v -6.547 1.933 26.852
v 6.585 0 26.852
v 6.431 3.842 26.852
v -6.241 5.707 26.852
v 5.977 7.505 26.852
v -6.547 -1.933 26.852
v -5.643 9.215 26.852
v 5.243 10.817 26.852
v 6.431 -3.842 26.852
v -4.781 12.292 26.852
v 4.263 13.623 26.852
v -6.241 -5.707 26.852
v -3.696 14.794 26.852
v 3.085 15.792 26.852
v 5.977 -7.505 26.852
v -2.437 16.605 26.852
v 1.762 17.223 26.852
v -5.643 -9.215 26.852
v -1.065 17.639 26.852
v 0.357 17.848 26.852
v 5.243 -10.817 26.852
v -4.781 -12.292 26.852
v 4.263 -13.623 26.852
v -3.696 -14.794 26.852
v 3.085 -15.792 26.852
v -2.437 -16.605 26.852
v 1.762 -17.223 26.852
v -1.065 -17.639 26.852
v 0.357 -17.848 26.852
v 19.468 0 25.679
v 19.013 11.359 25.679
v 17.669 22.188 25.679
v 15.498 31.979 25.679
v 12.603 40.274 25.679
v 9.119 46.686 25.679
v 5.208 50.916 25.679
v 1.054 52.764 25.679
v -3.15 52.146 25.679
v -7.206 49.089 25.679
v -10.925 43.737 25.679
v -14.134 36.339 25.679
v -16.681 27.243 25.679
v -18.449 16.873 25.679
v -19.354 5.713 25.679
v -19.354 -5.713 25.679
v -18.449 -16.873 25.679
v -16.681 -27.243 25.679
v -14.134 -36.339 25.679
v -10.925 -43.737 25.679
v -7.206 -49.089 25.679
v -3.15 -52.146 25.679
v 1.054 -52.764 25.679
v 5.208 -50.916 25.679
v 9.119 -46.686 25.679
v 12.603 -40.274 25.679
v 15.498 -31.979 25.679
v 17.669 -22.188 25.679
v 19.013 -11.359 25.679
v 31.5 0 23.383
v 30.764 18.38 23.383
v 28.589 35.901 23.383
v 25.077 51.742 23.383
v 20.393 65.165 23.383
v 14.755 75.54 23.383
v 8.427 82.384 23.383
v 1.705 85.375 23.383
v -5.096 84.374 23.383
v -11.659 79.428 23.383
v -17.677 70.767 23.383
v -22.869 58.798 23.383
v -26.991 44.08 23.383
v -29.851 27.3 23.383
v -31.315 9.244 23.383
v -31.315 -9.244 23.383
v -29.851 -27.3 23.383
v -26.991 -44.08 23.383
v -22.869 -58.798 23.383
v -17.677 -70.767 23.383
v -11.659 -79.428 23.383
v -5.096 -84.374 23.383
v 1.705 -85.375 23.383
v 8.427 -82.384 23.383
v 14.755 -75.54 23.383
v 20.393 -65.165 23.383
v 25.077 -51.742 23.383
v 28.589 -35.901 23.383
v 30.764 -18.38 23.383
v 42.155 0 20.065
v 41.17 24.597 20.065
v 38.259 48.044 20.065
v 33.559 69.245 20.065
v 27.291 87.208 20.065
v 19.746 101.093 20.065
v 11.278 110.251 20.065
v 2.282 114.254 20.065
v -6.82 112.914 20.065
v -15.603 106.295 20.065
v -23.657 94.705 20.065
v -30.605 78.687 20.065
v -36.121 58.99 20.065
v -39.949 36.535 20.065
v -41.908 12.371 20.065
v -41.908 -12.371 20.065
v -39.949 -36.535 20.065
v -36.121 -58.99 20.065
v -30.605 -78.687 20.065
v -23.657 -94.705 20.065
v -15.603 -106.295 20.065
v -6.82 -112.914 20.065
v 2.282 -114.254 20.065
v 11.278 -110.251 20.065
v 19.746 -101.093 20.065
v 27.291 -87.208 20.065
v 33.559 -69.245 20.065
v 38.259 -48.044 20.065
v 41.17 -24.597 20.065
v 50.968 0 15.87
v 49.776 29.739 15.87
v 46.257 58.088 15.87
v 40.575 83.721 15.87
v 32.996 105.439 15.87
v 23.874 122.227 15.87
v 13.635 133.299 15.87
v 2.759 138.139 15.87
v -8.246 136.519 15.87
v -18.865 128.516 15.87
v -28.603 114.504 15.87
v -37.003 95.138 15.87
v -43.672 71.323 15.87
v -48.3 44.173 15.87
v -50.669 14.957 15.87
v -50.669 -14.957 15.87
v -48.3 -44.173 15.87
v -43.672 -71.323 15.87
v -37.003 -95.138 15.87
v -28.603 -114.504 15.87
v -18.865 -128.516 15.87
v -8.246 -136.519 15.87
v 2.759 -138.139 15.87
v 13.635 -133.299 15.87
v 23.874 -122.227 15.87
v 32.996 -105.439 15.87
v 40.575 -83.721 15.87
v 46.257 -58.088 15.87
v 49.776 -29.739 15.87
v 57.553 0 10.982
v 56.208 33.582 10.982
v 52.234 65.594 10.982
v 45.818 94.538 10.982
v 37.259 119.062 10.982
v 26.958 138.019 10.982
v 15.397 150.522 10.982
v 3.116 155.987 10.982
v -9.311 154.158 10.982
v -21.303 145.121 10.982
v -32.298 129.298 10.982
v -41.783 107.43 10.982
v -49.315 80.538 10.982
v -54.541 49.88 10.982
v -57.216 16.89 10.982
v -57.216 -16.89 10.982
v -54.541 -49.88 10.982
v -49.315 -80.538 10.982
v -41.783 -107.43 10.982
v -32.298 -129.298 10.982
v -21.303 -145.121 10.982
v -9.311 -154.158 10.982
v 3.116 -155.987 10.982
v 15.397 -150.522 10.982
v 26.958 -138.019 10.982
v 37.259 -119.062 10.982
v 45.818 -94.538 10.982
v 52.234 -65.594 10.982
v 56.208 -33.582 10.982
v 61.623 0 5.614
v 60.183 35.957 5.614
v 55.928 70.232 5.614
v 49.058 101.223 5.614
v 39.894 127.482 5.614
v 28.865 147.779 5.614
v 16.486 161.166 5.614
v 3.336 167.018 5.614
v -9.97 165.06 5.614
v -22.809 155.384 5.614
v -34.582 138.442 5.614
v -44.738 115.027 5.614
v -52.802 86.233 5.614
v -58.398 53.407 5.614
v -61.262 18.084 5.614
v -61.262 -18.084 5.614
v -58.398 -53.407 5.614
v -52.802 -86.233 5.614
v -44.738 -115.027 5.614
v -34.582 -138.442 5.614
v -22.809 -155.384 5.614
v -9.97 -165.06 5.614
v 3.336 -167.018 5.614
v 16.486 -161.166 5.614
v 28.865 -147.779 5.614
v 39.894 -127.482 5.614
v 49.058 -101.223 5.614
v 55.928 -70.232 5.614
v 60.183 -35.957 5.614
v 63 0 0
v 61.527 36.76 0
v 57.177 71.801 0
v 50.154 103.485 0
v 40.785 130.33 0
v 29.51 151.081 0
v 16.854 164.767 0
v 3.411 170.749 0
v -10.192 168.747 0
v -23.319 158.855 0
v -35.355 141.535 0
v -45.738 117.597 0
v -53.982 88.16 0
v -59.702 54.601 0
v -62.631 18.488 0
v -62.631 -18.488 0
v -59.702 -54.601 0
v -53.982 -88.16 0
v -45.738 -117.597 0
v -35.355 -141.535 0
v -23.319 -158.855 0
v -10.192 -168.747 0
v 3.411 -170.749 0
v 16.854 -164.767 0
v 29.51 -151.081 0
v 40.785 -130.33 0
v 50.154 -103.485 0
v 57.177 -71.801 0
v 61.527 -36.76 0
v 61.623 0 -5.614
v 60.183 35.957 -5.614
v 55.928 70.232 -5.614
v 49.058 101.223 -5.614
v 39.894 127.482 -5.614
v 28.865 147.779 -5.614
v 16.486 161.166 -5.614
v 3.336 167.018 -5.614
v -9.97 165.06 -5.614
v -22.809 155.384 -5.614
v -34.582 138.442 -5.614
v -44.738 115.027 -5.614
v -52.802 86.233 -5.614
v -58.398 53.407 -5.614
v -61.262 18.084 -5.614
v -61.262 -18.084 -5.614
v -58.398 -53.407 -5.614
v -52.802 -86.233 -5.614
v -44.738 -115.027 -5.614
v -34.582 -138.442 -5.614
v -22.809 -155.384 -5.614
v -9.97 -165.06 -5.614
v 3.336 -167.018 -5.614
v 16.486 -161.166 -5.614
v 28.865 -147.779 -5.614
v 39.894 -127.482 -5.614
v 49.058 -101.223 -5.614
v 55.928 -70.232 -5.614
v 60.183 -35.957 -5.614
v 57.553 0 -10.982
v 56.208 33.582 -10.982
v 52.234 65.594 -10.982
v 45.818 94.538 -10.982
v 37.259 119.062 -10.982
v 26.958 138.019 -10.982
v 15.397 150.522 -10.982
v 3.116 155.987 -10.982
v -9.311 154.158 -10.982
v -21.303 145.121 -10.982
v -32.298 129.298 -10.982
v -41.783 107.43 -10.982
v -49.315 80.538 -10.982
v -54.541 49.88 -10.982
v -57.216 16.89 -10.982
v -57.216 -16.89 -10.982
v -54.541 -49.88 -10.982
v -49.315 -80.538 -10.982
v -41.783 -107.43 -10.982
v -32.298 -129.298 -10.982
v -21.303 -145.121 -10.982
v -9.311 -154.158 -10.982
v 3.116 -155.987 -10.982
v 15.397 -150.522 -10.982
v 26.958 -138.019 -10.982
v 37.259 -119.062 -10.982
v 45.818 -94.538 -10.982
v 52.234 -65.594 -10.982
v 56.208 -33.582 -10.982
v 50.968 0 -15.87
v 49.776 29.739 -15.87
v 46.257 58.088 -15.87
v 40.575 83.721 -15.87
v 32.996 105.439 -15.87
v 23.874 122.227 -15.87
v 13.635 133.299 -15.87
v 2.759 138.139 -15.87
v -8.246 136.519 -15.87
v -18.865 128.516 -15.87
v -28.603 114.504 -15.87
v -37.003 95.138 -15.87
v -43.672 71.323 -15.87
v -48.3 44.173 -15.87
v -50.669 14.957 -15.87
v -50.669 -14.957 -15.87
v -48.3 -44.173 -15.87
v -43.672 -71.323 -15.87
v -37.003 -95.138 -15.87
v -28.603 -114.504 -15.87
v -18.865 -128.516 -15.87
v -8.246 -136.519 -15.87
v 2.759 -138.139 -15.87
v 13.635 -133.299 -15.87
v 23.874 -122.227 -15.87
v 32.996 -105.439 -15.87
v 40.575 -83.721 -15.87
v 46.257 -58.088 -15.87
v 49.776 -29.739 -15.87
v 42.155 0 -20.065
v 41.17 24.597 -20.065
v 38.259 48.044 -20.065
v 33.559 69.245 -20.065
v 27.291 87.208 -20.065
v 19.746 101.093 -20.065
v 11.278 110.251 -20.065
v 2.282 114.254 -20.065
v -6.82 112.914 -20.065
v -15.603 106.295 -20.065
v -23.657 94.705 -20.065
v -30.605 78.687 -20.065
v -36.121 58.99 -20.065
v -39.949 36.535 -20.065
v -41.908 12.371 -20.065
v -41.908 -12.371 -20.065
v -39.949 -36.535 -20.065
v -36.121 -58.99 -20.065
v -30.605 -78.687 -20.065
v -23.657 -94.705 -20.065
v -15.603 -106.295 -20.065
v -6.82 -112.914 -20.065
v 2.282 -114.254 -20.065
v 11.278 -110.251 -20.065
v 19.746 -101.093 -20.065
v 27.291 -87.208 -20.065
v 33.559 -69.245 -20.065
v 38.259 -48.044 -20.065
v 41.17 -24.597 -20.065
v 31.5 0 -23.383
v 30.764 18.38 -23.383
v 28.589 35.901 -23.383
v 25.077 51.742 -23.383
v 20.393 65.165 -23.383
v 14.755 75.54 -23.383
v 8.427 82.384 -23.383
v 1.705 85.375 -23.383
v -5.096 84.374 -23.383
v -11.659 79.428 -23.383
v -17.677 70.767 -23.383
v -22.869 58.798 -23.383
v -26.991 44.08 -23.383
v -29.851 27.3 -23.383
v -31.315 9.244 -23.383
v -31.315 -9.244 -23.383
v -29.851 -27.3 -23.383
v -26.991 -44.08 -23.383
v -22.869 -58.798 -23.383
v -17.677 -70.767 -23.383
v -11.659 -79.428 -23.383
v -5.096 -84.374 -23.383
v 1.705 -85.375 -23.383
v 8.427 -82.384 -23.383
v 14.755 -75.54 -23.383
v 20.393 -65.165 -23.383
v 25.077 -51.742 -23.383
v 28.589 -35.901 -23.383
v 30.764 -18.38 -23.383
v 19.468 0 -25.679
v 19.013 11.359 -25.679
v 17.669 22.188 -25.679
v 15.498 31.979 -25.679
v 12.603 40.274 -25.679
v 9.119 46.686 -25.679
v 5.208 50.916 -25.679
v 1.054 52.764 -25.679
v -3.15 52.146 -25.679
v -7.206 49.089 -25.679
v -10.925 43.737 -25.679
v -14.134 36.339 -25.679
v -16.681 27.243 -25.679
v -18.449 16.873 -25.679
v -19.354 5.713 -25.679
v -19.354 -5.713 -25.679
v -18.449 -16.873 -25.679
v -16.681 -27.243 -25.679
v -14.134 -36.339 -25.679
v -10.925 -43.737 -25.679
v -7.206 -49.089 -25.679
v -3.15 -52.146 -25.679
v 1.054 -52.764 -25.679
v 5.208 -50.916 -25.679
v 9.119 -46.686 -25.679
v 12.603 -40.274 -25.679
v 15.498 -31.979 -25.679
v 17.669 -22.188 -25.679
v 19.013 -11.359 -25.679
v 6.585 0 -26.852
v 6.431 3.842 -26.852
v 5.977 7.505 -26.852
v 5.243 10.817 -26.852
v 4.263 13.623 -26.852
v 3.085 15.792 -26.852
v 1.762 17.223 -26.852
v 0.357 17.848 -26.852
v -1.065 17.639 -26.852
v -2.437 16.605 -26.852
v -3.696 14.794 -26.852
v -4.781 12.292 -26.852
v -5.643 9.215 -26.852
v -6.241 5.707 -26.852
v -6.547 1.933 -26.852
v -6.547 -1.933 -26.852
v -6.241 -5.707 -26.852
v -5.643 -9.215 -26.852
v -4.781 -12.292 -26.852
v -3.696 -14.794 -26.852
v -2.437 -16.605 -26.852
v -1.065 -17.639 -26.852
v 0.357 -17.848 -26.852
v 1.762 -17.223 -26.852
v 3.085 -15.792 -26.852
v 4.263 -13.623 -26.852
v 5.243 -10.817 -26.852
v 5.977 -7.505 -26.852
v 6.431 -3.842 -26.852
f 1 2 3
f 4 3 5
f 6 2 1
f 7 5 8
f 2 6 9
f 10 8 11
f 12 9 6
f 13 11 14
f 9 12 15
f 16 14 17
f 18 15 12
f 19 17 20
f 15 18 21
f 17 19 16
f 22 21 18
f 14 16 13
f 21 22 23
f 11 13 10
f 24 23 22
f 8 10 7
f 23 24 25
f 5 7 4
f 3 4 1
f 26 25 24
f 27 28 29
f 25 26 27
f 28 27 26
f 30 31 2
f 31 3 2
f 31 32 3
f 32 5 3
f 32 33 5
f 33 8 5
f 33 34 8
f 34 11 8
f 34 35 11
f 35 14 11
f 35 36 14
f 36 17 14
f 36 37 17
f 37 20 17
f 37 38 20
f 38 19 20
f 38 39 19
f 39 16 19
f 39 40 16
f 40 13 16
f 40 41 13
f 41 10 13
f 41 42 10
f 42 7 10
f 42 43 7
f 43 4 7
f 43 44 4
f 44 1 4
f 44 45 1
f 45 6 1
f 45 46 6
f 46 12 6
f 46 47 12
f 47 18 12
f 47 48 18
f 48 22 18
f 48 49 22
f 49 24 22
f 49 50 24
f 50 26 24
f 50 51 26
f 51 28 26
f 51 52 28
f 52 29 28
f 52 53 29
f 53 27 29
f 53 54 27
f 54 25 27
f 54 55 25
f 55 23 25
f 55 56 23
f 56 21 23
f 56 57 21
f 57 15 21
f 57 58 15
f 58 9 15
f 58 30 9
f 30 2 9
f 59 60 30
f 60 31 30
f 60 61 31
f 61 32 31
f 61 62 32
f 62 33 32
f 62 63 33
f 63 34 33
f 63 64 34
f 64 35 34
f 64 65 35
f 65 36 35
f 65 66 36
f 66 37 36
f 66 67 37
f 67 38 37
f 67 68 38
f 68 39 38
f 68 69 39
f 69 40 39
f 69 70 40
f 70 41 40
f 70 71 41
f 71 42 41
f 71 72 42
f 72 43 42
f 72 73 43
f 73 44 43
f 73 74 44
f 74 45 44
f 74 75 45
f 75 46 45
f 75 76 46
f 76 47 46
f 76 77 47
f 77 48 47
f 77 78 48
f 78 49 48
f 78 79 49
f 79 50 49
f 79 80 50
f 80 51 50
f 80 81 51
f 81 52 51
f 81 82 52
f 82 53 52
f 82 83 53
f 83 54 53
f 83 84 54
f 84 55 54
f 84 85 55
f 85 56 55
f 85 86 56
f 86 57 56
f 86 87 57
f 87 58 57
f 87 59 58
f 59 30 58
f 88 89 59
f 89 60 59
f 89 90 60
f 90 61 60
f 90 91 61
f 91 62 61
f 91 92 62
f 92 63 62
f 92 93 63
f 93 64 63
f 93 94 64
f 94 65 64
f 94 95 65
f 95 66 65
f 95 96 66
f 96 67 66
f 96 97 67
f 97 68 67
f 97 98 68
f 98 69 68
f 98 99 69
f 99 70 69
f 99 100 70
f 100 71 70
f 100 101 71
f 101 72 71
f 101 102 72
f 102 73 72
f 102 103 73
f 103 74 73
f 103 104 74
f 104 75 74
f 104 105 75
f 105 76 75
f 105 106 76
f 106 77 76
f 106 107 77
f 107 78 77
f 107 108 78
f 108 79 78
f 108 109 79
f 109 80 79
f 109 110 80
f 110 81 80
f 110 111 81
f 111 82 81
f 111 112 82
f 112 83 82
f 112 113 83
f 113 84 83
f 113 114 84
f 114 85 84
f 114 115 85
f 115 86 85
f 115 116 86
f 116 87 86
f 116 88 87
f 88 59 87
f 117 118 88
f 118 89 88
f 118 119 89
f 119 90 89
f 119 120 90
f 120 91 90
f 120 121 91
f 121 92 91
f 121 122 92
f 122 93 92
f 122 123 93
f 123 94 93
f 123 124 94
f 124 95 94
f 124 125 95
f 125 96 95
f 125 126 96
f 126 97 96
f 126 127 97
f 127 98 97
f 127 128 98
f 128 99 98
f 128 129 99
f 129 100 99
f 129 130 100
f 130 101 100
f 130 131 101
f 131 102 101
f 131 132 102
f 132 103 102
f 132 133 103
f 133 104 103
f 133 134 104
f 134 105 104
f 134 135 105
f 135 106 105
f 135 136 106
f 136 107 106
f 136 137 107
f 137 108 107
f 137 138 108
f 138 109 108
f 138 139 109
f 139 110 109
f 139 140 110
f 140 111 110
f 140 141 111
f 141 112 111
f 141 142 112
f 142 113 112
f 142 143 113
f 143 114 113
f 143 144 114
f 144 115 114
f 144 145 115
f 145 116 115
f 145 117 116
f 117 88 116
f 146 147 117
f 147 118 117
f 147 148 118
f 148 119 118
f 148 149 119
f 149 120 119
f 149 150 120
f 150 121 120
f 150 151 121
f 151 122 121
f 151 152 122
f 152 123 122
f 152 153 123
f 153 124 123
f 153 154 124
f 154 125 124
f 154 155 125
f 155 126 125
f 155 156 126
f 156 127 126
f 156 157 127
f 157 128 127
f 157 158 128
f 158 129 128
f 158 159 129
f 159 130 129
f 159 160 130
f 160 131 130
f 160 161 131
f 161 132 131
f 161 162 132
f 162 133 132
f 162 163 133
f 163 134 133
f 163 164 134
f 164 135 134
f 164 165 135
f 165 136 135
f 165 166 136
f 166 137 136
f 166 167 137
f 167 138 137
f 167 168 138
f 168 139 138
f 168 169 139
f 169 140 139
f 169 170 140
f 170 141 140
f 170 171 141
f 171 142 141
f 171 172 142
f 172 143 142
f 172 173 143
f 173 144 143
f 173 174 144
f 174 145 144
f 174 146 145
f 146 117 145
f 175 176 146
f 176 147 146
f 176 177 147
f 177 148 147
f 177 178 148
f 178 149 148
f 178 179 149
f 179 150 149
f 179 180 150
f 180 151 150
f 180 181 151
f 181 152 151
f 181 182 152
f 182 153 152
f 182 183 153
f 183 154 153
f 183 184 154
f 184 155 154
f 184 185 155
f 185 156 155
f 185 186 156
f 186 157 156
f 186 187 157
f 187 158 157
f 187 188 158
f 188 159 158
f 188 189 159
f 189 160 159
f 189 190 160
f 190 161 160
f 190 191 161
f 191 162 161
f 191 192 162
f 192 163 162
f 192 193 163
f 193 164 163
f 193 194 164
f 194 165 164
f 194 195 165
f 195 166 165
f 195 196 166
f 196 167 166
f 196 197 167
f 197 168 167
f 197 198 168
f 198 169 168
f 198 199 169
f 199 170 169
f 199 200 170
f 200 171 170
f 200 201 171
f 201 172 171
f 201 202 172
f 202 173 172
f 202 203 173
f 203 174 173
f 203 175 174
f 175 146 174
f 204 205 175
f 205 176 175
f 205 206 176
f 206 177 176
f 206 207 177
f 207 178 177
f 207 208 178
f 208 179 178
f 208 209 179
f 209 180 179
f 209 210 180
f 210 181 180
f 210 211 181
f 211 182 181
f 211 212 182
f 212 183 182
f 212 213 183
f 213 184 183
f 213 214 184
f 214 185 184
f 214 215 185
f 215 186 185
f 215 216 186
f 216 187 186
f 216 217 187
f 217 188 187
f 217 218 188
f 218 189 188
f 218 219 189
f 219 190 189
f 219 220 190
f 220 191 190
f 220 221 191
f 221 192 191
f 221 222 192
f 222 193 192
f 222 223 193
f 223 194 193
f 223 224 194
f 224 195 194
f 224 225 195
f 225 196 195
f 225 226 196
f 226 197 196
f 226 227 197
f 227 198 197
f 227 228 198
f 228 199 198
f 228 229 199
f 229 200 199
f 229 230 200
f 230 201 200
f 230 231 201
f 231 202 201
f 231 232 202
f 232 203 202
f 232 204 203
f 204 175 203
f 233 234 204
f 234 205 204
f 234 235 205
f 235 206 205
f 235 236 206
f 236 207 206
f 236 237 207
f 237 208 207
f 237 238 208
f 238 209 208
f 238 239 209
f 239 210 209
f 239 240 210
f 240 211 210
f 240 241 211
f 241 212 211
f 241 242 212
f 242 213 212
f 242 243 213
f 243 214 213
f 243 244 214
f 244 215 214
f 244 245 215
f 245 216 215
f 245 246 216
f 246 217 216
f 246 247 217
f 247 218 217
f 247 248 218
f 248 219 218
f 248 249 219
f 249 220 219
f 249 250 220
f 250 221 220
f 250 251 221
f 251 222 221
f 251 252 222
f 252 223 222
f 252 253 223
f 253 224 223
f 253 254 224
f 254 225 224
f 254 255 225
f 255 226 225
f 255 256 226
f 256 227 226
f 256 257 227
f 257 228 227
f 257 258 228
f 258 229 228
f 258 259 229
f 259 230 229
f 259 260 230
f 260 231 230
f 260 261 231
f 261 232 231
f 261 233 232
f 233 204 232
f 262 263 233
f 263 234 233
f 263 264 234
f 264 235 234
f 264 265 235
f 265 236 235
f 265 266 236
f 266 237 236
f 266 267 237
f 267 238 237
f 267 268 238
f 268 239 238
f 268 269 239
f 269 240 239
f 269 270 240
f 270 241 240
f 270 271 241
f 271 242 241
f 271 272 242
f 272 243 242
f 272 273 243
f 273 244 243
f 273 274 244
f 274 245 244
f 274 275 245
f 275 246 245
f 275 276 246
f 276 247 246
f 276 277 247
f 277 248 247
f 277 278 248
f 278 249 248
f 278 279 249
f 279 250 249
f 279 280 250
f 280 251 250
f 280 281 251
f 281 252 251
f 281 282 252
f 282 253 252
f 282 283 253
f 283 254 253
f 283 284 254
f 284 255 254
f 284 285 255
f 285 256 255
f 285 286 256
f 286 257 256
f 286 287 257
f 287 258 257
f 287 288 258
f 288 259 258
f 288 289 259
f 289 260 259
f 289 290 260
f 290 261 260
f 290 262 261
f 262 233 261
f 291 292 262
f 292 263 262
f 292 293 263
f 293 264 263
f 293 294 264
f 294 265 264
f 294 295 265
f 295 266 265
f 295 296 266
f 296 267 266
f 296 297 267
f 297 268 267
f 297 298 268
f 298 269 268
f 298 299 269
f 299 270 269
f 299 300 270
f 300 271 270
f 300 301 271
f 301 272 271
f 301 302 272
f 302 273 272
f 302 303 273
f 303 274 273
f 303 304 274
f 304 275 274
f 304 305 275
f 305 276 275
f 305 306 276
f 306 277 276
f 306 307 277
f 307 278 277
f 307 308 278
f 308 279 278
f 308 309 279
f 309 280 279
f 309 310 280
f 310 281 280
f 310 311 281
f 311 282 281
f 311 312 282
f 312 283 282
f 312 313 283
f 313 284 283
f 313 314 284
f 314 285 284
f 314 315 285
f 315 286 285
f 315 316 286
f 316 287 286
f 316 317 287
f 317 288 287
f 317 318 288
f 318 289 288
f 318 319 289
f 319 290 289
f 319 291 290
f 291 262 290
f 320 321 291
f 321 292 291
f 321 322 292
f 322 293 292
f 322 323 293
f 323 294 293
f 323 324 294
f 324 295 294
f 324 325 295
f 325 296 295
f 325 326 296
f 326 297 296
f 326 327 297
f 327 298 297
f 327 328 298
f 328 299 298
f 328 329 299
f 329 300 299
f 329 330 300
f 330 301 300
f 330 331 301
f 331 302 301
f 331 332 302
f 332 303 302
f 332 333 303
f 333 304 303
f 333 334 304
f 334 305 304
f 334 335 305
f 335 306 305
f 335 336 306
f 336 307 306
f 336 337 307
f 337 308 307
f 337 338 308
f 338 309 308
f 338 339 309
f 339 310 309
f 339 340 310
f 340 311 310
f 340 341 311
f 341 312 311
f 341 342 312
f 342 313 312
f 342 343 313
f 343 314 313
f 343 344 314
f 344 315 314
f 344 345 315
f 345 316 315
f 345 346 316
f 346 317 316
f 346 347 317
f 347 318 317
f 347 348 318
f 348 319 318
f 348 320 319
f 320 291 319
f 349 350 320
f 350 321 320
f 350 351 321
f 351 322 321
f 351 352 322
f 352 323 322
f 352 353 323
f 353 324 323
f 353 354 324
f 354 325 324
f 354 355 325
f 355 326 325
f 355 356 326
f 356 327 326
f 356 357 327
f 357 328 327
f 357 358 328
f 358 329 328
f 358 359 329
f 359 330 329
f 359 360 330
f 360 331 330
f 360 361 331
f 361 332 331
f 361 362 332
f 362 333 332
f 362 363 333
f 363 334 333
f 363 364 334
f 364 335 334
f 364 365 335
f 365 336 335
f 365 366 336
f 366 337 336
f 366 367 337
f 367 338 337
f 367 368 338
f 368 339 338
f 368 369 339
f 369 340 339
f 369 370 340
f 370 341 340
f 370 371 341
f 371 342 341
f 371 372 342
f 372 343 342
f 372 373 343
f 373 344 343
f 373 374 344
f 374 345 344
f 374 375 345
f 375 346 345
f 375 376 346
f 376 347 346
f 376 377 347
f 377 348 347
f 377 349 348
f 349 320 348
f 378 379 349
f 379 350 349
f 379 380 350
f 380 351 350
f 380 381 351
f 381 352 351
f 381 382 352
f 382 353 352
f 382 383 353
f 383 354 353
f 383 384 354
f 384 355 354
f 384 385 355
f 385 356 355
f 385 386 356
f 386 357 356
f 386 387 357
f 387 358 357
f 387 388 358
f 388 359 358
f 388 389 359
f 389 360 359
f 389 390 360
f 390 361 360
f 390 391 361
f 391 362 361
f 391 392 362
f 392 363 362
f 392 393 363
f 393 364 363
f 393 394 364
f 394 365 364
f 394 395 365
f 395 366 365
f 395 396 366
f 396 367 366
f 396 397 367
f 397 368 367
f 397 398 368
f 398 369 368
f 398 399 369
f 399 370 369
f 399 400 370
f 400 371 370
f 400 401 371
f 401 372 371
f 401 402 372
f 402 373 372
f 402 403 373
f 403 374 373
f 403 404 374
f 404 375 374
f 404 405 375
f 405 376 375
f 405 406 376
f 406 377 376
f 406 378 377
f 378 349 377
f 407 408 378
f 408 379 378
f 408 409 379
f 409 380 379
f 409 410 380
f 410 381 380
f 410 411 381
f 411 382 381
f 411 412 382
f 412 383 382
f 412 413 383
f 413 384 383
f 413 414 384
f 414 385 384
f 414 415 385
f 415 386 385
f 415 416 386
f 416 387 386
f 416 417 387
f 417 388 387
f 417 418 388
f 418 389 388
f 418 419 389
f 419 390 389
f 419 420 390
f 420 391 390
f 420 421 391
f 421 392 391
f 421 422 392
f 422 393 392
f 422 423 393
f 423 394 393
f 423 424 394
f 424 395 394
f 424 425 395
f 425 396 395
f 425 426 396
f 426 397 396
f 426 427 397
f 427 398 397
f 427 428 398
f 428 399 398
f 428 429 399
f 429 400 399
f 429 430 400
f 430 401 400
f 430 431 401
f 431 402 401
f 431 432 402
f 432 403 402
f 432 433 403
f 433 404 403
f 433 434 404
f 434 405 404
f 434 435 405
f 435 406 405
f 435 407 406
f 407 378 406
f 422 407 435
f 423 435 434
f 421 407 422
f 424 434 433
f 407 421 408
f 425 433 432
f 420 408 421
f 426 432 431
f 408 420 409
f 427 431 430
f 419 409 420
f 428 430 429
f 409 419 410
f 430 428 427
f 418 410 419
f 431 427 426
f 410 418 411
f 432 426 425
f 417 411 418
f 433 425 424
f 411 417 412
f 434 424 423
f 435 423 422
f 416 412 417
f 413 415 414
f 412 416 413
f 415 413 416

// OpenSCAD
// Generated by SolidPython 1.0.1 on 2020-07-29 00:46:48


scale(v = [7, 19, 3]) {
	sphere(r = 9);
}
/***********************************************
*********      SolidPython code:      **********
************************************************
 
# import packages: SolidPython
from solid import *
from solid.utils import *
from itertools import chain, combinations, permutations


class Resize:

    def __init__(self, scad_file):
        self.scad_file = scad_file
        #self.scad_file = import_scad(scad_file)
        # cone/cylinder param:
        self.r1 = 0
        self.r2 = 0
        self.h = 0
        # rectangular prism param:
        self.w = 0
        self.l = 0
        # ellipse param:
        self.r = 0

    # import OpenScad code (file name corresponds to shape)


    # classify shape + parameters
    def assign(self, param1, param2, param3):
        if self.scad_file == 'cone.scad':
            self.r1 = param1
            self.r2 = param2
            self.h = param3
        elif self.scad_file == 'cylinder.scad':
            self.r1 = param1
            self.r2 = param2
            self.h = param3
        elif self.scad_file == 'rectangularPrism.scad':
            self.h = param1
            self.l = param2
            self.w = param3
        else:
            self.r = param1
            self.h = param2

    # resize parameters
    def iterate(self):
        x = range(3, 20, 2)
        i = 1
        if self.scad_file == 'cone.scad':
            tempList = list(permutations(x, 2))
            for temp in tempList:
                param1 = temp[0]
                param2 = temp[1]
                filepath = 'produced_scad_files/' + 'cone' + str(param1) + '_' + str(param2) + '_' + '.scad'
                scad_render_to_file(cylinder(h=param1, r1=param2, r2=0), filepath)

        elif self.scad_file == 'cylinder.scad':
            tempList = list(permutations(x, 3))
            for temp in tempList:
                param1 = temp[0]
                param2 = temp[1]
                filepath = 'produced_scad_files/' + 'cylinder' + str(param1) + '_' + str(param2) + '_' + '.scad'
                scad_render_to_file(cylinder(h=param1, r1=param2, r2=param2), filepath)

        elif self.scad_file == 'rectangularPrism.scad':
            tempList = list(permutations(x, 3))
            for temp in tempList:
                param1 = temp[0]
                param2 = temp[1]
                param3 = temp[2]
                filepath = 'produced_scad_files/' + 'rectangularPrism' + str(param1) + '_' + str(param2) + '_' + str(
                    param3) + '.scad'
                scad_render_to_file(cube(size=(param1, param2, param3)), filepath)

        elif self.scad_file == 'ellipse.scad':
            tempList = list(permutations(x, 4))
            for temp in tempList:
                param1 = temp[0]
                param2 = temp[1]
                param3 = temp[2]
                param4 = temp[3]
                filepath = 'produced_scad_files/' + 'ellipse' + str(param1) + '_' + str(param2) + '_' + str(param3) + '_' + str(param4) + '.scad'
                scad_render_to_file(scale([param1, param2, param3])(sphere(r=param4)), filepath)

    def render_to_scadfile(self):
        scad_render_to_file(scad, 'example.scad') 
 
************************************************/
